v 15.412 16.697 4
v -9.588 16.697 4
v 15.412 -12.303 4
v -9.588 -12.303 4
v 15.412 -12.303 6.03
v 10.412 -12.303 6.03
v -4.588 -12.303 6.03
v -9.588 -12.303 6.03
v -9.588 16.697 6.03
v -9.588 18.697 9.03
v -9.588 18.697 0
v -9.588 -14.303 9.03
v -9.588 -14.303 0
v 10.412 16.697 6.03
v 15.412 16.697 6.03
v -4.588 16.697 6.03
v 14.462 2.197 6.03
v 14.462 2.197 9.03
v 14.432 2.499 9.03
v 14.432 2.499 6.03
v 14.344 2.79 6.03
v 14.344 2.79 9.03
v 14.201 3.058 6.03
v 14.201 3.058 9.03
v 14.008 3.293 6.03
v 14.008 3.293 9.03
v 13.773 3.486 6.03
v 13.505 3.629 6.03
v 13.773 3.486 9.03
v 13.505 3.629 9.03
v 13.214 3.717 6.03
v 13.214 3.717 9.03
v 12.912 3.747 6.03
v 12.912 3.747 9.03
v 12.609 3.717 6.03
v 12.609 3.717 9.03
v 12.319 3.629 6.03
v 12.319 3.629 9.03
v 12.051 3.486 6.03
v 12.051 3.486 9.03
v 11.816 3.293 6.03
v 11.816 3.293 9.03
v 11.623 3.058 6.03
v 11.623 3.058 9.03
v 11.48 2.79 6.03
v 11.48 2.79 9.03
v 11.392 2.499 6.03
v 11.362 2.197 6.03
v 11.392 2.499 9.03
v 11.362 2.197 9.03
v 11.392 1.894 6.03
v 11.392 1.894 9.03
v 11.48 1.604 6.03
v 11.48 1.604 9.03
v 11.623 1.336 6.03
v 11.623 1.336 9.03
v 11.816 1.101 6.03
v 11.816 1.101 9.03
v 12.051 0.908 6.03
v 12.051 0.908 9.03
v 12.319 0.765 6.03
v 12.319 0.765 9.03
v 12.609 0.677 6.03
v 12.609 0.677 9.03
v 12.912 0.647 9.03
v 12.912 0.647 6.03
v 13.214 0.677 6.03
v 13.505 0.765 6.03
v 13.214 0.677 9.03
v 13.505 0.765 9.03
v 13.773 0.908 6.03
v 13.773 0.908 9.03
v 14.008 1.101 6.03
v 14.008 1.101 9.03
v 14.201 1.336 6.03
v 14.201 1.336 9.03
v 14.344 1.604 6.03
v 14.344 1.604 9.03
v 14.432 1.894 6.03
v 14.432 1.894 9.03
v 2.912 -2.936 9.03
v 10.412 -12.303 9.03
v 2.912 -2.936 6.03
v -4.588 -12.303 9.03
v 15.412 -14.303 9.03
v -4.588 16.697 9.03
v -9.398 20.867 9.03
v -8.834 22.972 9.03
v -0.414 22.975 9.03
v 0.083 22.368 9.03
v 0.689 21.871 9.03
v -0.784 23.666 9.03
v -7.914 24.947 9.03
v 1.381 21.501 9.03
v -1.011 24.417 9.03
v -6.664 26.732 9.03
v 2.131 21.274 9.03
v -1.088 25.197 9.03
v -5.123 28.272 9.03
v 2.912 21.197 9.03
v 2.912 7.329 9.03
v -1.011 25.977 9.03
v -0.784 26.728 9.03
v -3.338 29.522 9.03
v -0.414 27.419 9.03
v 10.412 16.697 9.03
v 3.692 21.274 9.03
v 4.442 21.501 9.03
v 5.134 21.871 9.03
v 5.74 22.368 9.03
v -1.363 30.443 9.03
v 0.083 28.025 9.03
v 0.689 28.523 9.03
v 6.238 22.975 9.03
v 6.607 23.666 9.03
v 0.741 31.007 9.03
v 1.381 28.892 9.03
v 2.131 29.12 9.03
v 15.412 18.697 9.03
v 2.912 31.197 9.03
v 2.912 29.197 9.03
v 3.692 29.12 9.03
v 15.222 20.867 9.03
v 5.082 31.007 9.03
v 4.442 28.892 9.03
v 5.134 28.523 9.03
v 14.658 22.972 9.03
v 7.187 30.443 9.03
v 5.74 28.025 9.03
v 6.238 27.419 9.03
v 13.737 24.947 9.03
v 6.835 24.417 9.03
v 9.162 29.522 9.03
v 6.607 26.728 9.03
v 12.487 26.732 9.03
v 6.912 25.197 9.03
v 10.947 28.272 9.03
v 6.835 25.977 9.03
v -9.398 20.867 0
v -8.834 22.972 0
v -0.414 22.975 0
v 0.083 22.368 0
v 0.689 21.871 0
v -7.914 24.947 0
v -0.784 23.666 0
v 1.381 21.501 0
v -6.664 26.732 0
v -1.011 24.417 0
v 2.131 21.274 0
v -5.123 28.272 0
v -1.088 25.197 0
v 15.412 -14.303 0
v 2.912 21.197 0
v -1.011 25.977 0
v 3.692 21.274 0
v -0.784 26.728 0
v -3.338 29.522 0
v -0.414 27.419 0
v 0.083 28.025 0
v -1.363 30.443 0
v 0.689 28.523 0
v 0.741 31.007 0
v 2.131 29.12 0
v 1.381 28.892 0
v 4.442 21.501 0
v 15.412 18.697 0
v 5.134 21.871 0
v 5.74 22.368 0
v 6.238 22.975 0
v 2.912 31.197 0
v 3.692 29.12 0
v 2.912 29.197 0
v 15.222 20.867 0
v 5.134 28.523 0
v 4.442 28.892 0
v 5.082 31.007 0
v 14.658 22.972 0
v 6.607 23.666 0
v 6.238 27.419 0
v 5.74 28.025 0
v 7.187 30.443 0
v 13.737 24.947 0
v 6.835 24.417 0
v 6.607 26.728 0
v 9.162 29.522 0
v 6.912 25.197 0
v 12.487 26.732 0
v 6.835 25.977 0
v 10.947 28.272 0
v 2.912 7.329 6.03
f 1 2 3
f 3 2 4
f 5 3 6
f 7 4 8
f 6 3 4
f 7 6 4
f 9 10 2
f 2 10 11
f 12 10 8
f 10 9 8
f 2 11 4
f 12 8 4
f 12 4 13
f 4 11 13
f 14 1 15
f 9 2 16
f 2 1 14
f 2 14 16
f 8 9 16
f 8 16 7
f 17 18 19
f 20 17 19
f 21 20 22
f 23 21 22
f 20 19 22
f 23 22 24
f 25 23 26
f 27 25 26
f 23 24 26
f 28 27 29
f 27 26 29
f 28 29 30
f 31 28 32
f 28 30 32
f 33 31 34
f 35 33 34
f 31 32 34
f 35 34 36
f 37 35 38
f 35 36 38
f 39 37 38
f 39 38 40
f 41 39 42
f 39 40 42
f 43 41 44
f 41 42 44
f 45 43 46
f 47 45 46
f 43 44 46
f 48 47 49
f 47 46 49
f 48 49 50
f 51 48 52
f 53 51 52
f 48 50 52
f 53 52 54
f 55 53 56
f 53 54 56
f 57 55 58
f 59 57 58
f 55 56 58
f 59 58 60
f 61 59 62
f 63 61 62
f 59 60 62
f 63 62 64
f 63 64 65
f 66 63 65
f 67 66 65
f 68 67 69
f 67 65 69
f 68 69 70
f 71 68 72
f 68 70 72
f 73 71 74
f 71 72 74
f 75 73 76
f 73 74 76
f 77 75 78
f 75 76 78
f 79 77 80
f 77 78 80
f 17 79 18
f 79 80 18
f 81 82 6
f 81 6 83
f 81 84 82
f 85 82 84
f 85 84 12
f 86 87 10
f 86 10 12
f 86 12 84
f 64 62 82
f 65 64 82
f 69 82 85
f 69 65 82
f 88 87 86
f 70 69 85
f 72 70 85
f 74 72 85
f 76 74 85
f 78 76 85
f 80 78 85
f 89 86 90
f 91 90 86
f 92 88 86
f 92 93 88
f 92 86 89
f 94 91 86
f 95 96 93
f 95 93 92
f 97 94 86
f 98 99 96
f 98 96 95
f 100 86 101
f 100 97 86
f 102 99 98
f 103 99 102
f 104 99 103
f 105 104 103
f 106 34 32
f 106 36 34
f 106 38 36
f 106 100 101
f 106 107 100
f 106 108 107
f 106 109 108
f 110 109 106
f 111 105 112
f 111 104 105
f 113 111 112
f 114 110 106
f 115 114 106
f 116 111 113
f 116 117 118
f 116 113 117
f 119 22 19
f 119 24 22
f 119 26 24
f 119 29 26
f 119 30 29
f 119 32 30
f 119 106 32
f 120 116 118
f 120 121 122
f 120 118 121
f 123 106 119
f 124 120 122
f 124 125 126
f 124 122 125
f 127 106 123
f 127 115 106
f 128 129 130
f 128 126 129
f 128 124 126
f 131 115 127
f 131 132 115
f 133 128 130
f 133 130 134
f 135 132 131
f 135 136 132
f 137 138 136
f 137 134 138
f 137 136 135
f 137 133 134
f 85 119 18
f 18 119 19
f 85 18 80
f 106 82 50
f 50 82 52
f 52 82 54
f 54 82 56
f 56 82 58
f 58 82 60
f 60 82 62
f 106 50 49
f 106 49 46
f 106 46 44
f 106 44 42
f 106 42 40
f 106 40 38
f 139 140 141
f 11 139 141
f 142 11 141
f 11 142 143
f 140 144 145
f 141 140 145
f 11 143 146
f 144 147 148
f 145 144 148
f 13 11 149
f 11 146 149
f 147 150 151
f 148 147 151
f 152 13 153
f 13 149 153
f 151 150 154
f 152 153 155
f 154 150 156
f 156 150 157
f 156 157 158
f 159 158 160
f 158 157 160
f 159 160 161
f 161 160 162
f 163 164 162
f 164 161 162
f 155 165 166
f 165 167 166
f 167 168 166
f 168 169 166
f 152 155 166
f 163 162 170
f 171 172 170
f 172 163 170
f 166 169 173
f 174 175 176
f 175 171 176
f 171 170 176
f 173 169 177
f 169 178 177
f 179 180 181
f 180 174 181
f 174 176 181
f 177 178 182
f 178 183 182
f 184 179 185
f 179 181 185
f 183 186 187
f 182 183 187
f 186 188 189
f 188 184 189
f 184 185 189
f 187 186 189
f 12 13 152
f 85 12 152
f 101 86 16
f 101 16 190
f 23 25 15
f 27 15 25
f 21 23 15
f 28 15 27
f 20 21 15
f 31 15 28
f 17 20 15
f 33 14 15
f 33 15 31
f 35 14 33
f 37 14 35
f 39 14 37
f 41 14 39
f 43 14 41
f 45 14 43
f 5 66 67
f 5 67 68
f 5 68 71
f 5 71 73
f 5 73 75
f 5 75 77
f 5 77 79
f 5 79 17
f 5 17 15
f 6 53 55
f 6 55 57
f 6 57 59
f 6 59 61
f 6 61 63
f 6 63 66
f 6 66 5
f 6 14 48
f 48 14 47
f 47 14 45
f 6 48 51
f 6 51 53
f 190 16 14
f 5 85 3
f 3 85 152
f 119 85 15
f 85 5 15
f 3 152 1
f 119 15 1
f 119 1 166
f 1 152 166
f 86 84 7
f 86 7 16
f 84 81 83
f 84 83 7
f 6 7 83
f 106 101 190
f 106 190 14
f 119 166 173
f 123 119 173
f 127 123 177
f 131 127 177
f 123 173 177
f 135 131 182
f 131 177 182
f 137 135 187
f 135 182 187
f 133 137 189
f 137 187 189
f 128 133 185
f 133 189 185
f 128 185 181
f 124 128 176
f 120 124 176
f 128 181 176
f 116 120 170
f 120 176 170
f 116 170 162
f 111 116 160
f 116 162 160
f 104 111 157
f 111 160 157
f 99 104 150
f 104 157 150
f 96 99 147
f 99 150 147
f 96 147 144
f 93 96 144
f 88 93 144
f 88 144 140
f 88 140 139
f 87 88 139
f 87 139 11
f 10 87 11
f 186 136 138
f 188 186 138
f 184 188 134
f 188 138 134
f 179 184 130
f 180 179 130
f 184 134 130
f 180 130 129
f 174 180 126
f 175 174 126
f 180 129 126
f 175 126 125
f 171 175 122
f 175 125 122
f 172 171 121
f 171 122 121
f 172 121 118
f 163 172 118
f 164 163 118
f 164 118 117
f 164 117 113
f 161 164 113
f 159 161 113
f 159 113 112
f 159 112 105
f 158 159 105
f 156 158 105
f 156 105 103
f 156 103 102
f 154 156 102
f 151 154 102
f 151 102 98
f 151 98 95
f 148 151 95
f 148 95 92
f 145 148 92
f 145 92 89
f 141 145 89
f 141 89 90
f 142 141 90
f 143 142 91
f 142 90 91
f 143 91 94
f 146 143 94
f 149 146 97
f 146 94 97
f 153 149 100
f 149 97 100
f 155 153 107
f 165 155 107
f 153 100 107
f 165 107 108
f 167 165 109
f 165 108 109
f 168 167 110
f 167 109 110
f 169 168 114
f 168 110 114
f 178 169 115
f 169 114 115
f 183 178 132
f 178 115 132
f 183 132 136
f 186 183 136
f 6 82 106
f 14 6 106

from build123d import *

# Parameters (mm, degrees)
F1_DEPTH  = 9.03
F2_W      = 29
F2_H      = 2.03
F3_DEPTH  = 25.001
F4_W      = 15
F4_H      = 29
F5_DEPTH  = 3
F7_DEPTH  = 3
F8_R      = 1.55
F9_DEPTH  = 3
F10_R     = 4
F11_DEPTH = 9.031


with BuildPart() as f1:
    # F0 (on Top) → F1 (new body)
    with BuildSketch(Plane.XY):
        with BuildLine():
            ThreePointArc((15.4117660597, 18.6968654121), (2.9117660597, 31.1968654121), (-9.5882339403, 18.6968654121))
            Line((-9.5882339403, 18.6968654121), (15.4117660597, 18.6968654121))
        make_face()
        with BuildLine():
            Line((15.4117660597, 18.6968654121), (-9.5882339403, 18.6968654121))
            ThreePointArc((-9.5882339403, 18.6968654121), (2.9117660597, 6.1968654121), (15.4117660597, 18.6968654121))
        make_face()
        with BuildLine():
            ThreePointArc((15.4117660597, 18.6968654121), (2.9117660597, 6.1968654121), (-9.5882339403, 18.6968654121))
            Line((-9.5882339403, 18.6968654121), (-9.5882339403, -14.3031345879))
            Line((-9.5882339403, -14.3031345879), (15.4117660597, -14.3031345879))
            Line((15.4117660597, -14.3031345879), (15.4117660597, 18.6968654121))
        make_face()
    extrude(amount=F1_DEPTH)

    # F2 (on face) → F3 (cut, through all)
    with BuildSketch(Plane(origin=(-9.5882339403, 0, 0), x_dir=(0, -1, 0), z_dir=(-1, 0, 0))):
        with Locations((-2.1968654121, 5.015)):
            Rectangle(F2_W, F2_H)
    extrude(amount=-F3_DEPTH, mode=Mode.SUBTRACT)

    # F4 (on face) → F5 (cut, through all)
    with BuildSketch(Plane.XY.offset(9.03)):
        with Locations((2.9117660597, 2.1968654121)):
            Rectangle(F4_W, F4_H)
    extrude(amount=-F5_DEPTH, mode=Mode.SUBTRACT)

    # F6 (on face) → F7 (join)
    with BuildSketch(Plane.XY.offset(9.03)):
        Polygon((2.9117660597, -2.9356375903), (-4.5882339403, -12.3031345879), (10.4117660597, -12.3031345879), align=None)
        Polygon((10.4117660597, 16.6968654121), (-4.5882339403, 16.6968654121), (2.9117660597, 7.3293684145), align=None)
    extrude(amount=-F7_DEPTH)

    # F8 (on face) → F9 (cut, through all)
    with BuildSketch(Plane.XY.offset(9.03)):
        with Locations((12.9117660597, 2.1968654121)):
            Circle(F8_R)
    extrude(amount=-F9_DEPTH, mode=Mode.SUBTRACT)

    # F10 (on face) → F11 (cut, through all)
    with BuildSketch(Plane.XY.offset(9.03)):
        with Locations((2.9117660597, 25.1968654121)):
            Circle(F10_R)
    extrude(amount=-F11_DEPTH, mode=Mode.SUBTRACT)


solid = f1.part
